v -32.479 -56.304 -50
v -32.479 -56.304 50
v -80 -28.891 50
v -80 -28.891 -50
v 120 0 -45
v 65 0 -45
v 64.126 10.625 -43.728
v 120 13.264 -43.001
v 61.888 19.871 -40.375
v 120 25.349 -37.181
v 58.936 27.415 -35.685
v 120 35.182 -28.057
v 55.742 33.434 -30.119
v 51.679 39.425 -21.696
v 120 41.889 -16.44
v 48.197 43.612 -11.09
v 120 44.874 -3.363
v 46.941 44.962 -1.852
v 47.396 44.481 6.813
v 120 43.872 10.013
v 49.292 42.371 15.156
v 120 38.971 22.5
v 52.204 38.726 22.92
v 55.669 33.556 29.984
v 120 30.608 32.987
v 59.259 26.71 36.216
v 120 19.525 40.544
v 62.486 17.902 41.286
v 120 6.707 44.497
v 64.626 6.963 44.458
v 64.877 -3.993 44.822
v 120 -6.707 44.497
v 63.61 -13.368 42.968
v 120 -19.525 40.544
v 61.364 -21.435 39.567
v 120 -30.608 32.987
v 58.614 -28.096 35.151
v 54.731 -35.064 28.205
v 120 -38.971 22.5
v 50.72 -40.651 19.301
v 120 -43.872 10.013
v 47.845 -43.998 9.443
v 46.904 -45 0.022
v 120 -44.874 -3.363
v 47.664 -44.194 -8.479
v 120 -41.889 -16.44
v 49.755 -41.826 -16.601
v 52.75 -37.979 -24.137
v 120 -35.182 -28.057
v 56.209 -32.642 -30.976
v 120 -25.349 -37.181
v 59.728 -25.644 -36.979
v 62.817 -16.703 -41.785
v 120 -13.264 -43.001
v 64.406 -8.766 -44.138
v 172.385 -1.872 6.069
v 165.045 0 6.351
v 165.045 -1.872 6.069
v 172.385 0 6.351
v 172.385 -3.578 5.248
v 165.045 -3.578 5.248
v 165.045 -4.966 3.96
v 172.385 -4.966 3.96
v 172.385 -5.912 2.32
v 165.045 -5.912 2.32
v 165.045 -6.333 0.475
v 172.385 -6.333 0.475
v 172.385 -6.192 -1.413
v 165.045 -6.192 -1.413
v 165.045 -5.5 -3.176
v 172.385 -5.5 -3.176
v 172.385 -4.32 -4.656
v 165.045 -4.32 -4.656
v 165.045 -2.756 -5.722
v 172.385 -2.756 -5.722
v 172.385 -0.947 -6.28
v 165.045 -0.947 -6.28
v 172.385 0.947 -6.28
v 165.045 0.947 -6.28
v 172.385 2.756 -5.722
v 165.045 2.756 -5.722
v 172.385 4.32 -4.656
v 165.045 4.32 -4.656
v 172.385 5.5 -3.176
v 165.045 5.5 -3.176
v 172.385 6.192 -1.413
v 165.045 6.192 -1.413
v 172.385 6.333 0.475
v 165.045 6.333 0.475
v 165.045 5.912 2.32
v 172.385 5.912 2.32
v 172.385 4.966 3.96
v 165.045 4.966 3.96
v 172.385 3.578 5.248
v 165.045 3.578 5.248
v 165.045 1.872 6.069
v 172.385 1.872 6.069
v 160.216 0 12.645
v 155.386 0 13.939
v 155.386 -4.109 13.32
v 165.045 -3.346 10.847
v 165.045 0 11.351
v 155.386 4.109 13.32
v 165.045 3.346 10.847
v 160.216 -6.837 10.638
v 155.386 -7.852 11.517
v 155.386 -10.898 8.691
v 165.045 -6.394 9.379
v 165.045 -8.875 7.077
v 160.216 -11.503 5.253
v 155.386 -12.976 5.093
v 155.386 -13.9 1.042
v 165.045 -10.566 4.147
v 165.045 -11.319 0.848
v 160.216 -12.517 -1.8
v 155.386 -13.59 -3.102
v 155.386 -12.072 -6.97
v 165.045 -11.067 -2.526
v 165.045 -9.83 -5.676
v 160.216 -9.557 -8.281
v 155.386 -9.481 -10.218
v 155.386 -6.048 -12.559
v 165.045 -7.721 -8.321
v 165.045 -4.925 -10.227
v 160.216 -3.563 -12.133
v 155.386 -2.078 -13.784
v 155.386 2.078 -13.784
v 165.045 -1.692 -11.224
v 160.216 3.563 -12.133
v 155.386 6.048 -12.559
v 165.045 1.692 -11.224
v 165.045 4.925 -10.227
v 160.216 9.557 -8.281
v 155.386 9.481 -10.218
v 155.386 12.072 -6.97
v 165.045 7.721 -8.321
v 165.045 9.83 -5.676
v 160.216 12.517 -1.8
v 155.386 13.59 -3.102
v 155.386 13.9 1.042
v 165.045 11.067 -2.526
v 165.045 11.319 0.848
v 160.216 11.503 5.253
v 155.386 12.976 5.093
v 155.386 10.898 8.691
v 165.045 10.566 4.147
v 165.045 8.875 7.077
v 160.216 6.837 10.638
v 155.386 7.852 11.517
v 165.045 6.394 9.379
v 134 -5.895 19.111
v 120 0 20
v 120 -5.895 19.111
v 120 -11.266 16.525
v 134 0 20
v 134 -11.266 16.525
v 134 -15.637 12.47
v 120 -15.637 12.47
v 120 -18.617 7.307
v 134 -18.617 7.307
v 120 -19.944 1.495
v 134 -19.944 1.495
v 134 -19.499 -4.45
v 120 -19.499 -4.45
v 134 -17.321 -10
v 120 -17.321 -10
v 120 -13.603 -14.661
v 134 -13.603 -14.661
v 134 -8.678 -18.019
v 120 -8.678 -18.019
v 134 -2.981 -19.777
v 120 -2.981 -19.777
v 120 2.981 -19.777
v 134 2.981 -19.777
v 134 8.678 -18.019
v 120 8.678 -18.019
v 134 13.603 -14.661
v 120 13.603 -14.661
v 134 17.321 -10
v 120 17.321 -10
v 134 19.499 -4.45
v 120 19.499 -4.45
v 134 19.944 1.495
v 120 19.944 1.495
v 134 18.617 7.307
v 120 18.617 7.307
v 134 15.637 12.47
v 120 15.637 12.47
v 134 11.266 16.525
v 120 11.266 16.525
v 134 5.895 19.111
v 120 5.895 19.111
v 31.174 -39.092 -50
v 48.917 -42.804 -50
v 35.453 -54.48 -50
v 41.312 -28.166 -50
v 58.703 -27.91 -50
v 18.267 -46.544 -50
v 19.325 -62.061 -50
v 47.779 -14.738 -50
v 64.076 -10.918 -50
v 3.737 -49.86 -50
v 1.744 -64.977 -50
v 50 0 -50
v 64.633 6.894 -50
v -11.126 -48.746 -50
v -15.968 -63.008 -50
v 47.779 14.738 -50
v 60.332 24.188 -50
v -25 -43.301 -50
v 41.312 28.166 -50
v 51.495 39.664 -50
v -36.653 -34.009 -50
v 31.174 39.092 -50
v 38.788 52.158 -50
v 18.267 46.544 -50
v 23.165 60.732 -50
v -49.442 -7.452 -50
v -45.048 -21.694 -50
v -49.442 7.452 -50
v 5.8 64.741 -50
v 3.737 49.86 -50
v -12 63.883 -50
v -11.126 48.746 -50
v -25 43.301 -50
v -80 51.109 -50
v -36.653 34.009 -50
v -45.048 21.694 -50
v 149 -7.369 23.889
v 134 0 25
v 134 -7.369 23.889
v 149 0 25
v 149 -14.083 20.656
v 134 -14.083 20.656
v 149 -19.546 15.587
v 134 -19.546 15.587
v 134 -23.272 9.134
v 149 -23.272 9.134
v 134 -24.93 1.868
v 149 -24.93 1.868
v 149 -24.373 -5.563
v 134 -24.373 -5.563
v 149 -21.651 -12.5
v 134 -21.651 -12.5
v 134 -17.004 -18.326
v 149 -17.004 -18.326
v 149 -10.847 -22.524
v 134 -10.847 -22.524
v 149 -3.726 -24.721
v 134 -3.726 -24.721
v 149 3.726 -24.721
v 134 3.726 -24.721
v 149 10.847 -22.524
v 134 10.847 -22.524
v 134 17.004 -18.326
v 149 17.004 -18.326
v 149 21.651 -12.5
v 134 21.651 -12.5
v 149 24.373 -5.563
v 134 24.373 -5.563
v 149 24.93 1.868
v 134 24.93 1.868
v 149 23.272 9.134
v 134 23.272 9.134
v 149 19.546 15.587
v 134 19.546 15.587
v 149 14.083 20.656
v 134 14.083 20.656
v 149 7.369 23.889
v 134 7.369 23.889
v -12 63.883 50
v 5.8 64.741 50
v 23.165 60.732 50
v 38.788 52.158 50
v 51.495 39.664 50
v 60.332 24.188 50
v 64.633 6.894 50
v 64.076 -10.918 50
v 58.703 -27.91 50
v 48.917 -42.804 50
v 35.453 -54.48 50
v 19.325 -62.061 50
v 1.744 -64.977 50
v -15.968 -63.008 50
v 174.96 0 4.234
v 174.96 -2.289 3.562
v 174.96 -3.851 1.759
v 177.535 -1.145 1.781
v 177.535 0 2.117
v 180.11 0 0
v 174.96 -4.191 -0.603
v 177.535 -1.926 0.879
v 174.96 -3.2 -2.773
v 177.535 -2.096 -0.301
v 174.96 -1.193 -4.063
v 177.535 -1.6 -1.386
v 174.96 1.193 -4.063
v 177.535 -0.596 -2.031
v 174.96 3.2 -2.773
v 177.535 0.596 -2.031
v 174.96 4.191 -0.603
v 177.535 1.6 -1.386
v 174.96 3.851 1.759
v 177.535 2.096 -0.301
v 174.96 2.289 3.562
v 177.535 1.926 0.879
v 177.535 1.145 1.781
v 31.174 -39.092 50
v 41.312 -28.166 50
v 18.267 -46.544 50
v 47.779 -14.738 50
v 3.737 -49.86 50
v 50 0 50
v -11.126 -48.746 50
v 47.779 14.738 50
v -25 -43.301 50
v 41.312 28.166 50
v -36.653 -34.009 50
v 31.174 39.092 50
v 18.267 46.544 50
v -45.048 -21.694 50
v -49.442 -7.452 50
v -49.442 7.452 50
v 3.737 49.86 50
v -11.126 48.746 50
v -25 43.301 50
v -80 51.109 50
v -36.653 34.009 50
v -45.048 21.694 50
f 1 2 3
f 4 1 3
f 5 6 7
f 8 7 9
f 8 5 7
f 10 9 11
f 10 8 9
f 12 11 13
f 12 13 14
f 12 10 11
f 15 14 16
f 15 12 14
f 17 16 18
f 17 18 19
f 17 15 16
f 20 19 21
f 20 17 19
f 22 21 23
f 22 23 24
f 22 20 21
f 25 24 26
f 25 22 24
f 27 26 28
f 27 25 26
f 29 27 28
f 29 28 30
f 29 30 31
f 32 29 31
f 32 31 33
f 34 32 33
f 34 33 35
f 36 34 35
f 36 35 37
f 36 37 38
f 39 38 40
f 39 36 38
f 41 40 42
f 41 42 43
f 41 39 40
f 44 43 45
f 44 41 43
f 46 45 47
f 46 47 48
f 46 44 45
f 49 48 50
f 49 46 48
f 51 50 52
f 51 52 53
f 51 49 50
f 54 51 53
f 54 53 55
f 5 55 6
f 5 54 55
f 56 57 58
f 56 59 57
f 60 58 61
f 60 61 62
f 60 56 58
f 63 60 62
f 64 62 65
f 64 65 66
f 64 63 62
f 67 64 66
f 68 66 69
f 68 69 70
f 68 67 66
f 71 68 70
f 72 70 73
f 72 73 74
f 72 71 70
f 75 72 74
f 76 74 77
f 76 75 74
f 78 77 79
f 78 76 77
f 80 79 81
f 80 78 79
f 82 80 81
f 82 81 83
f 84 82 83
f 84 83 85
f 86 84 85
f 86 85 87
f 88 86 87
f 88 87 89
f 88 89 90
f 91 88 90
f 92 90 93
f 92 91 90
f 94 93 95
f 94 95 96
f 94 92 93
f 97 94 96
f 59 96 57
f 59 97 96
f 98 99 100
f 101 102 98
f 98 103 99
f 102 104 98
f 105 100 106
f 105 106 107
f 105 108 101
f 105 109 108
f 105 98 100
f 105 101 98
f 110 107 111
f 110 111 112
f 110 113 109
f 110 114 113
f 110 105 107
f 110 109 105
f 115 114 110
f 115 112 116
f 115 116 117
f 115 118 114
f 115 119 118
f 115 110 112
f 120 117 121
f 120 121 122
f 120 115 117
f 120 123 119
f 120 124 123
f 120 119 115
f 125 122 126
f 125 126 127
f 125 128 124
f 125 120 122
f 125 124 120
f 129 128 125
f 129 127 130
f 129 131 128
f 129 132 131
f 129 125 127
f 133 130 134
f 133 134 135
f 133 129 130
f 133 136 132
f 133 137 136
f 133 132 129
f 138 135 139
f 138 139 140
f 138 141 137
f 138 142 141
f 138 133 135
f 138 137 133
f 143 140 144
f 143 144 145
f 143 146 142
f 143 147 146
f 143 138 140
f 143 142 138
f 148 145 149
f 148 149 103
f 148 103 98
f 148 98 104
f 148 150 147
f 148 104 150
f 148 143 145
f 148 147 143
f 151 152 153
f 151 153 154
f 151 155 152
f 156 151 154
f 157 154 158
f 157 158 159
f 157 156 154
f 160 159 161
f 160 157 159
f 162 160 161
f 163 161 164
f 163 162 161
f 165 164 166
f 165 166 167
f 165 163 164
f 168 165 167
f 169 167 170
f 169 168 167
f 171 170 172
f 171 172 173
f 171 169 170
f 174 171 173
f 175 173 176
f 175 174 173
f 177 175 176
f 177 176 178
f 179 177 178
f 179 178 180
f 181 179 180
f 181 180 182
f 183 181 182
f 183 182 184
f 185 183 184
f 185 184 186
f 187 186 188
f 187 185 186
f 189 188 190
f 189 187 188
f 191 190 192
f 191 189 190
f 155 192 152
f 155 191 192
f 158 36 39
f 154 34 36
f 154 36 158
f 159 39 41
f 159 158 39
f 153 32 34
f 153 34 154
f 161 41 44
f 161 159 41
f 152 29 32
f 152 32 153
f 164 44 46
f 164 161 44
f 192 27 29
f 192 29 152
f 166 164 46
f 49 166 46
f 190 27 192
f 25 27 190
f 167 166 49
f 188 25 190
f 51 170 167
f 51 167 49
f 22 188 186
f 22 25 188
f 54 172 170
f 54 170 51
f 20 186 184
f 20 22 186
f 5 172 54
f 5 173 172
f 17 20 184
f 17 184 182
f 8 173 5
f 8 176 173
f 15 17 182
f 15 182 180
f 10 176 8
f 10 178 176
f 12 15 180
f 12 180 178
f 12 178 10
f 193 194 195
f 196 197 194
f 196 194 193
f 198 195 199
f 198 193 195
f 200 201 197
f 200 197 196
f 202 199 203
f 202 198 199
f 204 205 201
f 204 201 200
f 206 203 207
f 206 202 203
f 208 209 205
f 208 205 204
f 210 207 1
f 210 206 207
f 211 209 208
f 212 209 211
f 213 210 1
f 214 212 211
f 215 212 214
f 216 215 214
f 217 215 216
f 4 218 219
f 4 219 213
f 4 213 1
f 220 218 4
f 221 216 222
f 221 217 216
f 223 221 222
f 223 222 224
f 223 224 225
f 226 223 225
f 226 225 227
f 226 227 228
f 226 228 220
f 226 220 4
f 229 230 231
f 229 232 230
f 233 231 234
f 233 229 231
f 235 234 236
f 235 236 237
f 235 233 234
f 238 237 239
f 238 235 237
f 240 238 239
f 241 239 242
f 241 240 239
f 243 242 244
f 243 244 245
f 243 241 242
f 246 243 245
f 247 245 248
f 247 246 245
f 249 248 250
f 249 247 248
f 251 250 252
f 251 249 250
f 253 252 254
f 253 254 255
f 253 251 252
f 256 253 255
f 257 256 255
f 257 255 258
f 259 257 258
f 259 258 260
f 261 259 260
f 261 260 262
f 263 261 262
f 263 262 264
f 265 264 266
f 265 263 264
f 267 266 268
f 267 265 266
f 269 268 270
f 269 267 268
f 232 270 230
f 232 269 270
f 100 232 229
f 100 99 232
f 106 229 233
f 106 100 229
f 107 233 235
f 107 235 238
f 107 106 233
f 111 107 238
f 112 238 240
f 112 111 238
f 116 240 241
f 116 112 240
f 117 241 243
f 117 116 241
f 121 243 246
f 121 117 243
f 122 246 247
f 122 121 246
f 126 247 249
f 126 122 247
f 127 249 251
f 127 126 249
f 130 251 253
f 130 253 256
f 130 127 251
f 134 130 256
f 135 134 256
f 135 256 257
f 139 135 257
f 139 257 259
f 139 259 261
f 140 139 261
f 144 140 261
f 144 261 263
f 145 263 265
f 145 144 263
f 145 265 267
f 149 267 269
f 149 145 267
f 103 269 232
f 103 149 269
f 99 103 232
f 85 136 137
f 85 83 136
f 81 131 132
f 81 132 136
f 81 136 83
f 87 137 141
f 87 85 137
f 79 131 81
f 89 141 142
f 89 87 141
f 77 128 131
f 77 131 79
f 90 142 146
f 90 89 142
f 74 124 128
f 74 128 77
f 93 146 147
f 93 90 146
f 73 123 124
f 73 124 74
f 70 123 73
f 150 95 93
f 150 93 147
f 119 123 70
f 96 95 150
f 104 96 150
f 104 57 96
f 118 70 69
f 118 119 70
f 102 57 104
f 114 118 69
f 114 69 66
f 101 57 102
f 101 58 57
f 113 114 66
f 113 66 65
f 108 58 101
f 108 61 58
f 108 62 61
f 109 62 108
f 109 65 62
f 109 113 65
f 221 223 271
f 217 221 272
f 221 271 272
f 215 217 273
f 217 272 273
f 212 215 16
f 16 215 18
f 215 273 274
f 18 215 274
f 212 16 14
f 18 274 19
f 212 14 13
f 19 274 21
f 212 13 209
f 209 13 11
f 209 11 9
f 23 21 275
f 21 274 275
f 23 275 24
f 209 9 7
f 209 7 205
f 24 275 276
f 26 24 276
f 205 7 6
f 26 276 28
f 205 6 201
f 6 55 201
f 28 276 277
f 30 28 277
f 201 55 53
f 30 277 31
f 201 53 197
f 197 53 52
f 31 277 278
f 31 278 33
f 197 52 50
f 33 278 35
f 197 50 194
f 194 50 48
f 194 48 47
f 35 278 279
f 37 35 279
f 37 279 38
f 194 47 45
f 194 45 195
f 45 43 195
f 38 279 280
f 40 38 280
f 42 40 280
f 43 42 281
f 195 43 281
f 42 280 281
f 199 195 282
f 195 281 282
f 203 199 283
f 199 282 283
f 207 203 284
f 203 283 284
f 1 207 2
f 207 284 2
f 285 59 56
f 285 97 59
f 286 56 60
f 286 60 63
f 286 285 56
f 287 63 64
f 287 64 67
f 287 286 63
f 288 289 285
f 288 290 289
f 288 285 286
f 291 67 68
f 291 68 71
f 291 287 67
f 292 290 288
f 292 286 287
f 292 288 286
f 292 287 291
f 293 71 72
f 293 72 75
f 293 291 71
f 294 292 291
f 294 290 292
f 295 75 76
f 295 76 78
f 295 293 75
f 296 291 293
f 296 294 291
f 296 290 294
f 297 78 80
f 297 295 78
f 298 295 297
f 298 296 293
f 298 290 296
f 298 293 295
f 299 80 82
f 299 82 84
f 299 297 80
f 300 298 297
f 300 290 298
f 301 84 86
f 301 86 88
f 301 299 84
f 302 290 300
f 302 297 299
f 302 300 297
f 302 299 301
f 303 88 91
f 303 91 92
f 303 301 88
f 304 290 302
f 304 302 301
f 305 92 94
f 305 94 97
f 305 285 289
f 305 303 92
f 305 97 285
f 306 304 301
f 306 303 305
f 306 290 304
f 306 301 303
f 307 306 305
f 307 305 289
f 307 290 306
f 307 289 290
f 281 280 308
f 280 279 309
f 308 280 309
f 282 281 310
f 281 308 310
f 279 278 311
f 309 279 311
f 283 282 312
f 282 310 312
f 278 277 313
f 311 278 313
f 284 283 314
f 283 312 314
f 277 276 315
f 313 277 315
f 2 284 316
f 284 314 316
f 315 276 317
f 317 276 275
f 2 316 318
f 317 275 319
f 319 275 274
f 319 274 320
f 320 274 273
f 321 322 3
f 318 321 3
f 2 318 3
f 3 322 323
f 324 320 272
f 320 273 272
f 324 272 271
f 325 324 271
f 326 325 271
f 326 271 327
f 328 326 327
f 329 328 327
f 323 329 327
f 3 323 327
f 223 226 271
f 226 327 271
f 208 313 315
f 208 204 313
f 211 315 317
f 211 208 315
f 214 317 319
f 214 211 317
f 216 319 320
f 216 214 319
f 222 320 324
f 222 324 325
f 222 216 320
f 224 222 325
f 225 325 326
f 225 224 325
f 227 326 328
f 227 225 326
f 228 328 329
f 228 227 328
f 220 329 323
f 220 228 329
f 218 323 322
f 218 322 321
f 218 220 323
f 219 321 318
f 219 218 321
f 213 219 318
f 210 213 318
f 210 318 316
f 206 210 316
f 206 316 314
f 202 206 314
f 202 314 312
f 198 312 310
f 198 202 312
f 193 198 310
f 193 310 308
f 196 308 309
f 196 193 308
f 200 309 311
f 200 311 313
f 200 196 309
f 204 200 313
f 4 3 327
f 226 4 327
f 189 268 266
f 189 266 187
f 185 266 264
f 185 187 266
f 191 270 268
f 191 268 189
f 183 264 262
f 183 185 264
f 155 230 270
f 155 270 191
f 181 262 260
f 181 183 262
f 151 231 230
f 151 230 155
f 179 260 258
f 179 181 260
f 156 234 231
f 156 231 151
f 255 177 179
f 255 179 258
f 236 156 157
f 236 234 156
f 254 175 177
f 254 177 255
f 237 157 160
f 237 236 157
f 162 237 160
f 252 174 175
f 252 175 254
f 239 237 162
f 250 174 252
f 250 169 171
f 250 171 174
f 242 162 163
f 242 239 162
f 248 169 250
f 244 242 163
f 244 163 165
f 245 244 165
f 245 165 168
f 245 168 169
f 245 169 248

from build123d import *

# Parameters (mm, degrees)
IZIM1_R                          = 50
Y_KSEKLIK_EKSTR_ZYON1_DEPTH      = 50
Y_KSEKLIK_EKSTR_ZYON2_REACH      = 218.16
Y_KSEKLIK_EKSTR_ZYON2_END_RADIUS = 65
IZIM2_R                          = 45


with BuildPart() as part:
    # Çizim1 → Yükseklik-Ekstrüzyon1 (new, symmetric)
    with BuildSketch(Plane.XY):
        with BuildLine():
            Line((-80, -28.89070525), (-80, 51.10929475))
            Line((-80, 51.10929475), (-12, 63.882705015))
            ThreePointArc((-12, 63.882705015), (64.076421536, -10.918434095), (-32.479384713, -56.303548455))
            Line((-32.479384713, -56.303548455), (-80, -28.89070525))
        make_face()
        Circle(IZIM1_R, mode=Mode.SUBTRACT)
    extrude(amount=Y_KSEKLIK_EKSTR_ZYON1_DEPTH, both=True)

    # Yükseklik-Ekstrüzyon2: up to this cylinder (the profile starts outside it)
    y_kseklik_ekstr_zyon2_end = Plane(origin=(0, 0, 0), z_dir=(0, 0, -1)) * Cylinder(Y_KSEKLIK_EKSTR_ZYON2_END_RADIUS, 567.32, mode=Mode.PRIVATE)
    # Çizim2 → Yükseklik-Ekstrüzyon2 (add, up to the surface)
    with BuildSketch(Plane(origin=(120, 0, 0), x_dir=(0, 0, -1), z_dir=(1, 0, 0)), mode=Mode.PRIVATE) as y_kseklik_ekstr_zyon2_sk1:
        Circle(IZIM2_R)
    y_kseklik_ekstr_zyon2_tool1 = extrude(y_kseklik_ekstr_zyon2_sk1.sketch, amount=-Y_KSEKLIK_EKSTR_ZYON2_REACH, mode=Mode.PRIVATE) - y_kseklik_ekstr_zyon2_end
    add(y_kseklik_ekstr_zyon2_tool1.solids().sort_by_distance((120, 0, 0))[0])

    # Çizim3 → Döndür1 (revolve)
    with BuildSketch(Plane.XY, mode=Mode.PRIVATE) as d_nd_r1_sk:
        Polygon((164.385328123, -6.351150209), (172.385328123, -6.351150209), (180.109503873, 0), (120, 0), (120, -20), (134, -20), (134, -25), (149, -25), (155.385874648, -13.93934066), (165.04513291, -11.351150209), (165.04513291, -6.351150209), align=None)
    revolve(d_nd_r1_sk.sketch.rotate(Axis((0, 0, 0), (1, 0, 0)), 270), axis=Axis((0, 0, 0), (1, 0, 0)))


solid = part.part
